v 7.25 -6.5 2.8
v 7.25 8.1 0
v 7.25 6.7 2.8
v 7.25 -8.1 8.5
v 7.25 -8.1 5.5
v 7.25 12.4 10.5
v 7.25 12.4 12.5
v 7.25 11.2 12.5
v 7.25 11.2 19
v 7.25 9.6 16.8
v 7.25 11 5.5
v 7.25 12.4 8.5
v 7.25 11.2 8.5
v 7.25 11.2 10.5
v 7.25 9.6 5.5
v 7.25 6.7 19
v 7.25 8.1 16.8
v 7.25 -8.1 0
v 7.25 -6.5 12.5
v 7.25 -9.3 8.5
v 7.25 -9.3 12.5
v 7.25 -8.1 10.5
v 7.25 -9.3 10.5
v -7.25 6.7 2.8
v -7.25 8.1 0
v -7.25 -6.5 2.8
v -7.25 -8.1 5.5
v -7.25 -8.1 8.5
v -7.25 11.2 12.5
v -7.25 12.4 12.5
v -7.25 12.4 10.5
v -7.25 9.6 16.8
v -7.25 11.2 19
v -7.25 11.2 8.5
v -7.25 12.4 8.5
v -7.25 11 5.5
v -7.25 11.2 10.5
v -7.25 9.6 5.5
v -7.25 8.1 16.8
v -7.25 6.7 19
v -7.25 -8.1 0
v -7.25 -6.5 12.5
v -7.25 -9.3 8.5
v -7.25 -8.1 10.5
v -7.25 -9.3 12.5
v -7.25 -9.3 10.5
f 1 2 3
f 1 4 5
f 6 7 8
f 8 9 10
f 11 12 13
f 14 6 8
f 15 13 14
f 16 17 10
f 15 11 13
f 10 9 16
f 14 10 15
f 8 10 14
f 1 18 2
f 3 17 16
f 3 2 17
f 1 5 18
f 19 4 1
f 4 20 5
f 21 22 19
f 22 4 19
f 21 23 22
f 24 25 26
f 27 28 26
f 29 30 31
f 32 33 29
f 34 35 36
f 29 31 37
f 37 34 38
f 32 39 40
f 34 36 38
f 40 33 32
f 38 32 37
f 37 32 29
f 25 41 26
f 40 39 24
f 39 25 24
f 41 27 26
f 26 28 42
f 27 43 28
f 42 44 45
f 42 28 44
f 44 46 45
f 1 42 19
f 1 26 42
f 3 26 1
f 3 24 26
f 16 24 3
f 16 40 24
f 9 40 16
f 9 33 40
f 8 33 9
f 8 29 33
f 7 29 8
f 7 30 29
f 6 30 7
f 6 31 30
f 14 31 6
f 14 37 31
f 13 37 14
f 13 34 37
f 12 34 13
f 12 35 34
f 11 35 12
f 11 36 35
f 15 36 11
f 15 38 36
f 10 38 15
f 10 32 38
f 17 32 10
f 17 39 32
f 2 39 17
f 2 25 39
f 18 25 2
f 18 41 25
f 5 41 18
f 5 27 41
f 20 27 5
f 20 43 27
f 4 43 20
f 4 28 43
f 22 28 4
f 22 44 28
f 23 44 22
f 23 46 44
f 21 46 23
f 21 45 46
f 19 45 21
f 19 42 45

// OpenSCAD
// file: keystone.scad
function keystonePoints() = [
    [0,2],
    [1.4,2],
    [1.4,0],    
    [7.6,0],
    [9.5,2],
    [9.5,18.8],
    [4.6,24.6],
    [1.4,24.6],
    [1.4,22.6],
    [0,22.6],
];

function keystoneBlankPoints() = [
    [0,0],
    [0,16.2],
    [16.8,16.2],
    [16.8,17.7],
    [5.5,17.7],
    [5.5,19.1],
    [8.5,20.5],
    [8.5,19.3],
    [10.5,19.3],
    [10.5,20.5],
    [12.5,20.5],
    [12.5,19.3],
    [19,19.3],
    [19,14.8],
    [2.8,14.8],
    [2.8,1.6],
    [12.5,1.6],
    [12.5,-1.2],
    [10.5,-1.2],
    [10.5,0],
    [8.5,0],
    [8.5,-1.2],
    [5.5,0],
];

function keystoneWidth() = 15.2;
function keystoneHeight() = 24.6;
function keystoneDepth() = 9.5;

function keystoneBlankWidth() = 14.5;

module keystoneCutout(center=false) {
    let(w=keystoneWidth(), h=keystoneHeight(), z=keystoneDepth()) {
        translate([center ? w/-2 : 0,center ? h/-2 : 0,center ? z : 0])
            rotate([0,center ? 90 : 0,0])
                linear_extrude(w) 
                    polygon(keystonePoints());
    }
}

module keystoneBlank(center=false) {
    // The centering here is on the blank face, rather than the 
    // entire geometry. This makes it easier to mod.
    let(w=keystoneBlankWidth(), h=16.2, z=0) {
        translate([center ? w/2 : 0,center ? h/-2 : 0,center ? z : 0])
            rotate([0,center ? -90 : 0,0])
                linear_extrude(w) 
                    polygon(keystoneBlankPoints());
    }
}

module keystonePort(border=4.1, center=false) {
    let(w=keystoneWidth(), h=keystoneHeight(), z=keystoneDepth()) {
        translate([center ? 0 : 4,center ? 0 : 4,0]) difference() {
            linear_extrude(z)
                offset(delta=border, chamfer=true)
                    square([w,h], center=center);
            
            translate([center ? 0 : w,0,0])
                rotate([0,center ? 0 : -90,0])
                    keystoneCutout(center);
        }
    }
}
// main file
include <keystone.scad>

Select = 0; // [0:blank, 1:hole, 2:cutoutLeft, 3:cutoutRight]
diameter = 8;

if (Select==0) {
    keystoneBlank(center=true);
} 
else if (Select==1) {
    difference() {
        keystoneBlank(center=true);
        cylinder(h=3, d=diameter, $fn=20);
    }
} 
else if (Select==2) {
    let(w=keystoneBlankWidth()/2) {
        difference() {
            keystoneBlank(center=true);
            cylinder(h=3, d=diameter, $fn=20);
            
            translate([w/2,0,0])
                linear_extrude(3)
                    square([w,diameter],center=true);
        }
    }
}
else if (Select==3) {
    let(w=keystoneBlankWidth()/2) {
        difference() {
            keystoneBlank(center=true);
            cylinder(h=3, d=diameter, $fn=20);
            
            translate([w/-2,0,0])
                linear_extrude(3)
                    square([w,diameter],center=true);
        }
    }
}
